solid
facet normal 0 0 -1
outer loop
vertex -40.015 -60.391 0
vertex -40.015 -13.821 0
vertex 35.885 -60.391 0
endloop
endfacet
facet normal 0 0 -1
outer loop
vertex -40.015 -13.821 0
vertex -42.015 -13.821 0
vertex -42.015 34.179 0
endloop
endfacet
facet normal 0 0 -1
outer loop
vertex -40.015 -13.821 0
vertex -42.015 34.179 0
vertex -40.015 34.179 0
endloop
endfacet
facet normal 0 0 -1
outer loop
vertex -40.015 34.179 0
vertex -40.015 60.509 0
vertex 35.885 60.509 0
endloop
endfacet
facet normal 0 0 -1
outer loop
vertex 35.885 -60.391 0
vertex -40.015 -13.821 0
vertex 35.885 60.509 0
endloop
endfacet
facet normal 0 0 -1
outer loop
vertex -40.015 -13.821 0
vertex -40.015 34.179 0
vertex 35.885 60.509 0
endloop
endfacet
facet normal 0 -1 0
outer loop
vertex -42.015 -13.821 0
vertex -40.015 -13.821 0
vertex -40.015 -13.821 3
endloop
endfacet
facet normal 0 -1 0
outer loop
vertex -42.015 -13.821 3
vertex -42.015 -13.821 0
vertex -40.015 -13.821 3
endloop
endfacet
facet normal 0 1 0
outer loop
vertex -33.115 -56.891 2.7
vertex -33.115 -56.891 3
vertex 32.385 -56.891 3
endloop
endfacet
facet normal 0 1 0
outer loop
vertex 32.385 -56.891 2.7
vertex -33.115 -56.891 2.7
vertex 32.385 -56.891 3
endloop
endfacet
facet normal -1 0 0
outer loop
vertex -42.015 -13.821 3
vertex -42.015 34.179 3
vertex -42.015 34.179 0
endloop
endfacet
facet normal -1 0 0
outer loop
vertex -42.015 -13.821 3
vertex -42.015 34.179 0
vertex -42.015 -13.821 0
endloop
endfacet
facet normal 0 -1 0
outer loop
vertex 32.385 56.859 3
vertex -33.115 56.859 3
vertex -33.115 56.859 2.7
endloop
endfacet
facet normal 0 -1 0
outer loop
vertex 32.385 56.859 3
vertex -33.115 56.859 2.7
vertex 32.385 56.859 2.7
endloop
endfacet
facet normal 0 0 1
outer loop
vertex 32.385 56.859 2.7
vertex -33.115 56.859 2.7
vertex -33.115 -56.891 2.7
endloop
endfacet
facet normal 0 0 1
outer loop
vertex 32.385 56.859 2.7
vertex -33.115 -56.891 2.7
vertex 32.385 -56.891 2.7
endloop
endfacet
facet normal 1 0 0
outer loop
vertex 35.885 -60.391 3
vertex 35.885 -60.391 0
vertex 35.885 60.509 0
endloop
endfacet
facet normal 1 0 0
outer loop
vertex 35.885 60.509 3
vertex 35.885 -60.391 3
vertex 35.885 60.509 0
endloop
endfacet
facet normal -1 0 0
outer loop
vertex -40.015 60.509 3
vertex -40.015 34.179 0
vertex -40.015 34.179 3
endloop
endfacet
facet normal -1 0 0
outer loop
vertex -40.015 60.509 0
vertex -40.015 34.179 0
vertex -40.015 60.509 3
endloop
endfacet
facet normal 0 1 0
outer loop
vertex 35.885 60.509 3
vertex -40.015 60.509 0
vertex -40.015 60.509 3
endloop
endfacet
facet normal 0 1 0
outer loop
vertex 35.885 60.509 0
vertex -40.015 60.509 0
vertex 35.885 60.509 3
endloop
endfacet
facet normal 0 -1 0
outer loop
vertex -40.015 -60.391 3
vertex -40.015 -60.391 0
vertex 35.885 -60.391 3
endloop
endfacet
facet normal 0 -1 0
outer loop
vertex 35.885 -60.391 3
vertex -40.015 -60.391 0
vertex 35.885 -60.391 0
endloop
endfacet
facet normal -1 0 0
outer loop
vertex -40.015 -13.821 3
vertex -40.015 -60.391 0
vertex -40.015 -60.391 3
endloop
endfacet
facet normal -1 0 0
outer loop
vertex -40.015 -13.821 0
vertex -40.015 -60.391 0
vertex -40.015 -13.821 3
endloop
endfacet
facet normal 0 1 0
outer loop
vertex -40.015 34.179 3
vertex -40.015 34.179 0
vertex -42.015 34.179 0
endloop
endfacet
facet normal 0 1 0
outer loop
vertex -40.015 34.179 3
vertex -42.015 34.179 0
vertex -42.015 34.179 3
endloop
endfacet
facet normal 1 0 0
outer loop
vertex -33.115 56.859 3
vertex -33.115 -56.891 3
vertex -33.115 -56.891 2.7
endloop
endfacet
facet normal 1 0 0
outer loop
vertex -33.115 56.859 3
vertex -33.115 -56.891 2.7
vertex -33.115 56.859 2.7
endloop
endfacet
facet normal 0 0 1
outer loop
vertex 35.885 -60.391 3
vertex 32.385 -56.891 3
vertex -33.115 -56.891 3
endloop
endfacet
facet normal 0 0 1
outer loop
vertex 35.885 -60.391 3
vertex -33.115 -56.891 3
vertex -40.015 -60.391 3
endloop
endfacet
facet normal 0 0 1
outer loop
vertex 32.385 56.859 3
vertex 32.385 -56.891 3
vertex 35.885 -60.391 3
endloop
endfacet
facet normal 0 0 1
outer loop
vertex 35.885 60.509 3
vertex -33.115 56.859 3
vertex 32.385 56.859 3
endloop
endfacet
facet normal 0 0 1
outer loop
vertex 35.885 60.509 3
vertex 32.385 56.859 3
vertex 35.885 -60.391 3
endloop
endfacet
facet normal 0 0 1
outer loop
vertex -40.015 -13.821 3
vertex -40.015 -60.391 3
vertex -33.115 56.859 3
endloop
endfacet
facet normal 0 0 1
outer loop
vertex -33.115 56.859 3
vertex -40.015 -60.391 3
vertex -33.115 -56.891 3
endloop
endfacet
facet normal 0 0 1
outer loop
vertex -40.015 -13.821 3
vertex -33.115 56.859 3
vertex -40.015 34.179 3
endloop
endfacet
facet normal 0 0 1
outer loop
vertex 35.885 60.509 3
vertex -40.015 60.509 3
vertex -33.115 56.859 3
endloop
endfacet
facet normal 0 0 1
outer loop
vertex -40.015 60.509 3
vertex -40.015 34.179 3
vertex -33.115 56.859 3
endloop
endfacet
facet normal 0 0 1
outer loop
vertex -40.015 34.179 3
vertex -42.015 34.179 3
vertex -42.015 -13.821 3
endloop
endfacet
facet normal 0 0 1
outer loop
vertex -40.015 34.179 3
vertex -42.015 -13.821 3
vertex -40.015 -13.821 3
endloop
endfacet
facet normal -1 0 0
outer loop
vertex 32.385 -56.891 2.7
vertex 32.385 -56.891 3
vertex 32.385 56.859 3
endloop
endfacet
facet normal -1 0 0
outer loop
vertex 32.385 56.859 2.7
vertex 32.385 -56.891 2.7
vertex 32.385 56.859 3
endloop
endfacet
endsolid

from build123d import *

# Parameters (mm, degrees)
F0_W     = 75.9
F0_H     = 120.9
F1_DEPTH = 3
F2_W     = 65.5
F2_H     = 113.75
F3_DEPTH = 0.3
F4_W     = 48
F4_H     = 3
F5_DEPTH = 2


with BuildPart() as f1:
    # F0 (on Top) → F1 (new body)
    with BuildSketch(Plane.XY):
        with Locations((-2.06492, 0.058994)):
            Rectangle(F0_W, F0_H)
    extrude(amount=F1_DEPTH)

    # F2 (on face) → F3 (cut)
    with BuildSketch(Plane.XY.offset(3)):
        with Locations((-0.36492, -0.016006)):
            Rectangle(F2_W, F2_H)
    extrude(amount=-F3_DEPTH, mode=Mode.SUBTRACT)

    # F4 (on face) → F5 (join)
    with BuildSketch(Plane(origin=(-40.01492, 0, 0), x_dir=(0, -1, 0), z_dir=(-1, 0, 0))):
        with Locations((-10.178994, 1.5)):
            Rectangle(F4_W, F4_H)
    extrude(amount=F5_DEPTH)


solid = f1.part
